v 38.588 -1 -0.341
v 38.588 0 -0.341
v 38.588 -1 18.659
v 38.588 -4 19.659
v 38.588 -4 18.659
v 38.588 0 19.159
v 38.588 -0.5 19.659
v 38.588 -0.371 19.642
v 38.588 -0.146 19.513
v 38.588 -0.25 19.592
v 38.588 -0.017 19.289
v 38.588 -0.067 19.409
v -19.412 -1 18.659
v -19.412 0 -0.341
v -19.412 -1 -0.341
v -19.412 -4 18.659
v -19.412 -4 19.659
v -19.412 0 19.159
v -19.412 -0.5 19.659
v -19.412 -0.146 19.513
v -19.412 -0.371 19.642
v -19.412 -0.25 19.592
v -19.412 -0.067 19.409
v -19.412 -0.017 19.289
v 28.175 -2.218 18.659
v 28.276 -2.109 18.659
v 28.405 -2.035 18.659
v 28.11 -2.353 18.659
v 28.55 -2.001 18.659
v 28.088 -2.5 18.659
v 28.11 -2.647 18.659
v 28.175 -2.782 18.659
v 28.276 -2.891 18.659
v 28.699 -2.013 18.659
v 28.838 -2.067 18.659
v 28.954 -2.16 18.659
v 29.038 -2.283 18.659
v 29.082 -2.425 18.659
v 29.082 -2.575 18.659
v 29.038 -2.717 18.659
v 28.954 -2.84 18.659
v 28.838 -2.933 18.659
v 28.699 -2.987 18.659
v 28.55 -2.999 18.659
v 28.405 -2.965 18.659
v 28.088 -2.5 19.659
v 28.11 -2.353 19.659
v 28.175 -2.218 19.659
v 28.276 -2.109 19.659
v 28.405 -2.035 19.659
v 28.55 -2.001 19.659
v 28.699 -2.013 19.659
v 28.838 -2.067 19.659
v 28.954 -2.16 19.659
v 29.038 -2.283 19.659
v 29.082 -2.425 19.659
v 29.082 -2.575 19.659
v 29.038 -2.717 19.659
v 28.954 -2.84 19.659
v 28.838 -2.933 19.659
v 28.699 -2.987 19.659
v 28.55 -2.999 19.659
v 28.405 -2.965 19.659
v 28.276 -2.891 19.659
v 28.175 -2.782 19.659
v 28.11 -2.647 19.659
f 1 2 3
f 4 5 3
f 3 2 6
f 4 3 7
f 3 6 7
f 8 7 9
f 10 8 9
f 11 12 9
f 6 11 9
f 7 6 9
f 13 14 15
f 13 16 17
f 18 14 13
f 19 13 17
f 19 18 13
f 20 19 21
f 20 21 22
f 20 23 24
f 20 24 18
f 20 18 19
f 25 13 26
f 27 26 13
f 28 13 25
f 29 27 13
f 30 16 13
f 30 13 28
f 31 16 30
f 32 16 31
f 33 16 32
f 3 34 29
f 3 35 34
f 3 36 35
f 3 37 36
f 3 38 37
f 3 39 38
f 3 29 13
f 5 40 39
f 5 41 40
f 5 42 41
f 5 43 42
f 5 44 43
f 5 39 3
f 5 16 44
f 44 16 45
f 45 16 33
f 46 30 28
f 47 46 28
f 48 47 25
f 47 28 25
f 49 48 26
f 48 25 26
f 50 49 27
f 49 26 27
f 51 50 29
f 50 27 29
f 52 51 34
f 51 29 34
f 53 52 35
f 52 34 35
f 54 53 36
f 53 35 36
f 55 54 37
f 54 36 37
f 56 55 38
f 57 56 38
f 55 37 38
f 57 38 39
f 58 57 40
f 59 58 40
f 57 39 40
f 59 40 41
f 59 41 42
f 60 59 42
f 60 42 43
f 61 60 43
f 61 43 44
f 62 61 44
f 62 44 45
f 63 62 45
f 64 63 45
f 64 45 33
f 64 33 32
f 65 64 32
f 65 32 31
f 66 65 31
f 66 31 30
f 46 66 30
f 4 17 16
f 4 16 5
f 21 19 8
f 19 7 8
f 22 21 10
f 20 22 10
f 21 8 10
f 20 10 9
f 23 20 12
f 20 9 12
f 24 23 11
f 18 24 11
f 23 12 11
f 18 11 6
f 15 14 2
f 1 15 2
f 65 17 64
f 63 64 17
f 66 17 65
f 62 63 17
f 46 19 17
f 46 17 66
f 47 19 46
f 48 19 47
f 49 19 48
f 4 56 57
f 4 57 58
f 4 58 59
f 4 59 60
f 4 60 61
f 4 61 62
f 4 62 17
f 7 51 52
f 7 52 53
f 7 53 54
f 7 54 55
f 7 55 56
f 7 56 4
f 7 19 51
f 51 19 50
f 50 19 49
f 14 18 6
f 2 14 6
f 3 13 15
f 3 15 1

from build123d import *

# Parameters (mm, degrees)
F0_W     = 58
F0_H     = 20
F1_DEPTH = 4
F2_T     = -1
F3_W     = 1
F3_H     = 18
F4_DEPTH = 3
F5_R     = 0.5
F7_D     = 1
F7_DEPTH = 1


with BuildPart() as f1:
    # F0 (on Front) → F1 (new body)
    with BuildSketch(Plane.XZ):
        with Locations((9.587663, 9.659091)):
            Rectangle(F0_W, F0_H)
    extrude(amount=F1_DEPTH)

    # F2
    f2_openings = [f1.faces().sort_by_distance(p)[0] for p in [
        (9.587663, -4, 9.659091),
    ]]
    offset(amount=F2_T, openings=f2_openings)

    # F3 (on face) → F4 (cut)
    with BuildSketch(Plane.XZ.offset(4)):
        with Locations((-18.912337, 9.659091)):
            Rectangle(F3_W, F3_H)
        Polygon((38.587663, 0.659091), (37.587663, 0.659091), (-18.412337, 0.659091), (-19.412337, 0.659091), (-19.412337, -0.340909), (38.587663, -0.340909), align=None)
        with Locations((38.087663, 9.659091)):
            Rectangle(F3_W, F3_H)
    extrude(amount=-F4_DEPTH, mode=Mode.SUBTRACT)

    # F5
    f5_edges = [f1.edges().sort_by_distance(p)[0] for p in [
        (9.587663, 0, 19.659091),
    ]]
    fillet(f5_edges, radius=F5_R)

    # F7
    with Locations(Plane.XY.offset(19.659091)):
        with Locations((28.587663, -2.5)):
            Hole(F7_D / 2, depth=F7_DEPTH)


solid = f1.part
